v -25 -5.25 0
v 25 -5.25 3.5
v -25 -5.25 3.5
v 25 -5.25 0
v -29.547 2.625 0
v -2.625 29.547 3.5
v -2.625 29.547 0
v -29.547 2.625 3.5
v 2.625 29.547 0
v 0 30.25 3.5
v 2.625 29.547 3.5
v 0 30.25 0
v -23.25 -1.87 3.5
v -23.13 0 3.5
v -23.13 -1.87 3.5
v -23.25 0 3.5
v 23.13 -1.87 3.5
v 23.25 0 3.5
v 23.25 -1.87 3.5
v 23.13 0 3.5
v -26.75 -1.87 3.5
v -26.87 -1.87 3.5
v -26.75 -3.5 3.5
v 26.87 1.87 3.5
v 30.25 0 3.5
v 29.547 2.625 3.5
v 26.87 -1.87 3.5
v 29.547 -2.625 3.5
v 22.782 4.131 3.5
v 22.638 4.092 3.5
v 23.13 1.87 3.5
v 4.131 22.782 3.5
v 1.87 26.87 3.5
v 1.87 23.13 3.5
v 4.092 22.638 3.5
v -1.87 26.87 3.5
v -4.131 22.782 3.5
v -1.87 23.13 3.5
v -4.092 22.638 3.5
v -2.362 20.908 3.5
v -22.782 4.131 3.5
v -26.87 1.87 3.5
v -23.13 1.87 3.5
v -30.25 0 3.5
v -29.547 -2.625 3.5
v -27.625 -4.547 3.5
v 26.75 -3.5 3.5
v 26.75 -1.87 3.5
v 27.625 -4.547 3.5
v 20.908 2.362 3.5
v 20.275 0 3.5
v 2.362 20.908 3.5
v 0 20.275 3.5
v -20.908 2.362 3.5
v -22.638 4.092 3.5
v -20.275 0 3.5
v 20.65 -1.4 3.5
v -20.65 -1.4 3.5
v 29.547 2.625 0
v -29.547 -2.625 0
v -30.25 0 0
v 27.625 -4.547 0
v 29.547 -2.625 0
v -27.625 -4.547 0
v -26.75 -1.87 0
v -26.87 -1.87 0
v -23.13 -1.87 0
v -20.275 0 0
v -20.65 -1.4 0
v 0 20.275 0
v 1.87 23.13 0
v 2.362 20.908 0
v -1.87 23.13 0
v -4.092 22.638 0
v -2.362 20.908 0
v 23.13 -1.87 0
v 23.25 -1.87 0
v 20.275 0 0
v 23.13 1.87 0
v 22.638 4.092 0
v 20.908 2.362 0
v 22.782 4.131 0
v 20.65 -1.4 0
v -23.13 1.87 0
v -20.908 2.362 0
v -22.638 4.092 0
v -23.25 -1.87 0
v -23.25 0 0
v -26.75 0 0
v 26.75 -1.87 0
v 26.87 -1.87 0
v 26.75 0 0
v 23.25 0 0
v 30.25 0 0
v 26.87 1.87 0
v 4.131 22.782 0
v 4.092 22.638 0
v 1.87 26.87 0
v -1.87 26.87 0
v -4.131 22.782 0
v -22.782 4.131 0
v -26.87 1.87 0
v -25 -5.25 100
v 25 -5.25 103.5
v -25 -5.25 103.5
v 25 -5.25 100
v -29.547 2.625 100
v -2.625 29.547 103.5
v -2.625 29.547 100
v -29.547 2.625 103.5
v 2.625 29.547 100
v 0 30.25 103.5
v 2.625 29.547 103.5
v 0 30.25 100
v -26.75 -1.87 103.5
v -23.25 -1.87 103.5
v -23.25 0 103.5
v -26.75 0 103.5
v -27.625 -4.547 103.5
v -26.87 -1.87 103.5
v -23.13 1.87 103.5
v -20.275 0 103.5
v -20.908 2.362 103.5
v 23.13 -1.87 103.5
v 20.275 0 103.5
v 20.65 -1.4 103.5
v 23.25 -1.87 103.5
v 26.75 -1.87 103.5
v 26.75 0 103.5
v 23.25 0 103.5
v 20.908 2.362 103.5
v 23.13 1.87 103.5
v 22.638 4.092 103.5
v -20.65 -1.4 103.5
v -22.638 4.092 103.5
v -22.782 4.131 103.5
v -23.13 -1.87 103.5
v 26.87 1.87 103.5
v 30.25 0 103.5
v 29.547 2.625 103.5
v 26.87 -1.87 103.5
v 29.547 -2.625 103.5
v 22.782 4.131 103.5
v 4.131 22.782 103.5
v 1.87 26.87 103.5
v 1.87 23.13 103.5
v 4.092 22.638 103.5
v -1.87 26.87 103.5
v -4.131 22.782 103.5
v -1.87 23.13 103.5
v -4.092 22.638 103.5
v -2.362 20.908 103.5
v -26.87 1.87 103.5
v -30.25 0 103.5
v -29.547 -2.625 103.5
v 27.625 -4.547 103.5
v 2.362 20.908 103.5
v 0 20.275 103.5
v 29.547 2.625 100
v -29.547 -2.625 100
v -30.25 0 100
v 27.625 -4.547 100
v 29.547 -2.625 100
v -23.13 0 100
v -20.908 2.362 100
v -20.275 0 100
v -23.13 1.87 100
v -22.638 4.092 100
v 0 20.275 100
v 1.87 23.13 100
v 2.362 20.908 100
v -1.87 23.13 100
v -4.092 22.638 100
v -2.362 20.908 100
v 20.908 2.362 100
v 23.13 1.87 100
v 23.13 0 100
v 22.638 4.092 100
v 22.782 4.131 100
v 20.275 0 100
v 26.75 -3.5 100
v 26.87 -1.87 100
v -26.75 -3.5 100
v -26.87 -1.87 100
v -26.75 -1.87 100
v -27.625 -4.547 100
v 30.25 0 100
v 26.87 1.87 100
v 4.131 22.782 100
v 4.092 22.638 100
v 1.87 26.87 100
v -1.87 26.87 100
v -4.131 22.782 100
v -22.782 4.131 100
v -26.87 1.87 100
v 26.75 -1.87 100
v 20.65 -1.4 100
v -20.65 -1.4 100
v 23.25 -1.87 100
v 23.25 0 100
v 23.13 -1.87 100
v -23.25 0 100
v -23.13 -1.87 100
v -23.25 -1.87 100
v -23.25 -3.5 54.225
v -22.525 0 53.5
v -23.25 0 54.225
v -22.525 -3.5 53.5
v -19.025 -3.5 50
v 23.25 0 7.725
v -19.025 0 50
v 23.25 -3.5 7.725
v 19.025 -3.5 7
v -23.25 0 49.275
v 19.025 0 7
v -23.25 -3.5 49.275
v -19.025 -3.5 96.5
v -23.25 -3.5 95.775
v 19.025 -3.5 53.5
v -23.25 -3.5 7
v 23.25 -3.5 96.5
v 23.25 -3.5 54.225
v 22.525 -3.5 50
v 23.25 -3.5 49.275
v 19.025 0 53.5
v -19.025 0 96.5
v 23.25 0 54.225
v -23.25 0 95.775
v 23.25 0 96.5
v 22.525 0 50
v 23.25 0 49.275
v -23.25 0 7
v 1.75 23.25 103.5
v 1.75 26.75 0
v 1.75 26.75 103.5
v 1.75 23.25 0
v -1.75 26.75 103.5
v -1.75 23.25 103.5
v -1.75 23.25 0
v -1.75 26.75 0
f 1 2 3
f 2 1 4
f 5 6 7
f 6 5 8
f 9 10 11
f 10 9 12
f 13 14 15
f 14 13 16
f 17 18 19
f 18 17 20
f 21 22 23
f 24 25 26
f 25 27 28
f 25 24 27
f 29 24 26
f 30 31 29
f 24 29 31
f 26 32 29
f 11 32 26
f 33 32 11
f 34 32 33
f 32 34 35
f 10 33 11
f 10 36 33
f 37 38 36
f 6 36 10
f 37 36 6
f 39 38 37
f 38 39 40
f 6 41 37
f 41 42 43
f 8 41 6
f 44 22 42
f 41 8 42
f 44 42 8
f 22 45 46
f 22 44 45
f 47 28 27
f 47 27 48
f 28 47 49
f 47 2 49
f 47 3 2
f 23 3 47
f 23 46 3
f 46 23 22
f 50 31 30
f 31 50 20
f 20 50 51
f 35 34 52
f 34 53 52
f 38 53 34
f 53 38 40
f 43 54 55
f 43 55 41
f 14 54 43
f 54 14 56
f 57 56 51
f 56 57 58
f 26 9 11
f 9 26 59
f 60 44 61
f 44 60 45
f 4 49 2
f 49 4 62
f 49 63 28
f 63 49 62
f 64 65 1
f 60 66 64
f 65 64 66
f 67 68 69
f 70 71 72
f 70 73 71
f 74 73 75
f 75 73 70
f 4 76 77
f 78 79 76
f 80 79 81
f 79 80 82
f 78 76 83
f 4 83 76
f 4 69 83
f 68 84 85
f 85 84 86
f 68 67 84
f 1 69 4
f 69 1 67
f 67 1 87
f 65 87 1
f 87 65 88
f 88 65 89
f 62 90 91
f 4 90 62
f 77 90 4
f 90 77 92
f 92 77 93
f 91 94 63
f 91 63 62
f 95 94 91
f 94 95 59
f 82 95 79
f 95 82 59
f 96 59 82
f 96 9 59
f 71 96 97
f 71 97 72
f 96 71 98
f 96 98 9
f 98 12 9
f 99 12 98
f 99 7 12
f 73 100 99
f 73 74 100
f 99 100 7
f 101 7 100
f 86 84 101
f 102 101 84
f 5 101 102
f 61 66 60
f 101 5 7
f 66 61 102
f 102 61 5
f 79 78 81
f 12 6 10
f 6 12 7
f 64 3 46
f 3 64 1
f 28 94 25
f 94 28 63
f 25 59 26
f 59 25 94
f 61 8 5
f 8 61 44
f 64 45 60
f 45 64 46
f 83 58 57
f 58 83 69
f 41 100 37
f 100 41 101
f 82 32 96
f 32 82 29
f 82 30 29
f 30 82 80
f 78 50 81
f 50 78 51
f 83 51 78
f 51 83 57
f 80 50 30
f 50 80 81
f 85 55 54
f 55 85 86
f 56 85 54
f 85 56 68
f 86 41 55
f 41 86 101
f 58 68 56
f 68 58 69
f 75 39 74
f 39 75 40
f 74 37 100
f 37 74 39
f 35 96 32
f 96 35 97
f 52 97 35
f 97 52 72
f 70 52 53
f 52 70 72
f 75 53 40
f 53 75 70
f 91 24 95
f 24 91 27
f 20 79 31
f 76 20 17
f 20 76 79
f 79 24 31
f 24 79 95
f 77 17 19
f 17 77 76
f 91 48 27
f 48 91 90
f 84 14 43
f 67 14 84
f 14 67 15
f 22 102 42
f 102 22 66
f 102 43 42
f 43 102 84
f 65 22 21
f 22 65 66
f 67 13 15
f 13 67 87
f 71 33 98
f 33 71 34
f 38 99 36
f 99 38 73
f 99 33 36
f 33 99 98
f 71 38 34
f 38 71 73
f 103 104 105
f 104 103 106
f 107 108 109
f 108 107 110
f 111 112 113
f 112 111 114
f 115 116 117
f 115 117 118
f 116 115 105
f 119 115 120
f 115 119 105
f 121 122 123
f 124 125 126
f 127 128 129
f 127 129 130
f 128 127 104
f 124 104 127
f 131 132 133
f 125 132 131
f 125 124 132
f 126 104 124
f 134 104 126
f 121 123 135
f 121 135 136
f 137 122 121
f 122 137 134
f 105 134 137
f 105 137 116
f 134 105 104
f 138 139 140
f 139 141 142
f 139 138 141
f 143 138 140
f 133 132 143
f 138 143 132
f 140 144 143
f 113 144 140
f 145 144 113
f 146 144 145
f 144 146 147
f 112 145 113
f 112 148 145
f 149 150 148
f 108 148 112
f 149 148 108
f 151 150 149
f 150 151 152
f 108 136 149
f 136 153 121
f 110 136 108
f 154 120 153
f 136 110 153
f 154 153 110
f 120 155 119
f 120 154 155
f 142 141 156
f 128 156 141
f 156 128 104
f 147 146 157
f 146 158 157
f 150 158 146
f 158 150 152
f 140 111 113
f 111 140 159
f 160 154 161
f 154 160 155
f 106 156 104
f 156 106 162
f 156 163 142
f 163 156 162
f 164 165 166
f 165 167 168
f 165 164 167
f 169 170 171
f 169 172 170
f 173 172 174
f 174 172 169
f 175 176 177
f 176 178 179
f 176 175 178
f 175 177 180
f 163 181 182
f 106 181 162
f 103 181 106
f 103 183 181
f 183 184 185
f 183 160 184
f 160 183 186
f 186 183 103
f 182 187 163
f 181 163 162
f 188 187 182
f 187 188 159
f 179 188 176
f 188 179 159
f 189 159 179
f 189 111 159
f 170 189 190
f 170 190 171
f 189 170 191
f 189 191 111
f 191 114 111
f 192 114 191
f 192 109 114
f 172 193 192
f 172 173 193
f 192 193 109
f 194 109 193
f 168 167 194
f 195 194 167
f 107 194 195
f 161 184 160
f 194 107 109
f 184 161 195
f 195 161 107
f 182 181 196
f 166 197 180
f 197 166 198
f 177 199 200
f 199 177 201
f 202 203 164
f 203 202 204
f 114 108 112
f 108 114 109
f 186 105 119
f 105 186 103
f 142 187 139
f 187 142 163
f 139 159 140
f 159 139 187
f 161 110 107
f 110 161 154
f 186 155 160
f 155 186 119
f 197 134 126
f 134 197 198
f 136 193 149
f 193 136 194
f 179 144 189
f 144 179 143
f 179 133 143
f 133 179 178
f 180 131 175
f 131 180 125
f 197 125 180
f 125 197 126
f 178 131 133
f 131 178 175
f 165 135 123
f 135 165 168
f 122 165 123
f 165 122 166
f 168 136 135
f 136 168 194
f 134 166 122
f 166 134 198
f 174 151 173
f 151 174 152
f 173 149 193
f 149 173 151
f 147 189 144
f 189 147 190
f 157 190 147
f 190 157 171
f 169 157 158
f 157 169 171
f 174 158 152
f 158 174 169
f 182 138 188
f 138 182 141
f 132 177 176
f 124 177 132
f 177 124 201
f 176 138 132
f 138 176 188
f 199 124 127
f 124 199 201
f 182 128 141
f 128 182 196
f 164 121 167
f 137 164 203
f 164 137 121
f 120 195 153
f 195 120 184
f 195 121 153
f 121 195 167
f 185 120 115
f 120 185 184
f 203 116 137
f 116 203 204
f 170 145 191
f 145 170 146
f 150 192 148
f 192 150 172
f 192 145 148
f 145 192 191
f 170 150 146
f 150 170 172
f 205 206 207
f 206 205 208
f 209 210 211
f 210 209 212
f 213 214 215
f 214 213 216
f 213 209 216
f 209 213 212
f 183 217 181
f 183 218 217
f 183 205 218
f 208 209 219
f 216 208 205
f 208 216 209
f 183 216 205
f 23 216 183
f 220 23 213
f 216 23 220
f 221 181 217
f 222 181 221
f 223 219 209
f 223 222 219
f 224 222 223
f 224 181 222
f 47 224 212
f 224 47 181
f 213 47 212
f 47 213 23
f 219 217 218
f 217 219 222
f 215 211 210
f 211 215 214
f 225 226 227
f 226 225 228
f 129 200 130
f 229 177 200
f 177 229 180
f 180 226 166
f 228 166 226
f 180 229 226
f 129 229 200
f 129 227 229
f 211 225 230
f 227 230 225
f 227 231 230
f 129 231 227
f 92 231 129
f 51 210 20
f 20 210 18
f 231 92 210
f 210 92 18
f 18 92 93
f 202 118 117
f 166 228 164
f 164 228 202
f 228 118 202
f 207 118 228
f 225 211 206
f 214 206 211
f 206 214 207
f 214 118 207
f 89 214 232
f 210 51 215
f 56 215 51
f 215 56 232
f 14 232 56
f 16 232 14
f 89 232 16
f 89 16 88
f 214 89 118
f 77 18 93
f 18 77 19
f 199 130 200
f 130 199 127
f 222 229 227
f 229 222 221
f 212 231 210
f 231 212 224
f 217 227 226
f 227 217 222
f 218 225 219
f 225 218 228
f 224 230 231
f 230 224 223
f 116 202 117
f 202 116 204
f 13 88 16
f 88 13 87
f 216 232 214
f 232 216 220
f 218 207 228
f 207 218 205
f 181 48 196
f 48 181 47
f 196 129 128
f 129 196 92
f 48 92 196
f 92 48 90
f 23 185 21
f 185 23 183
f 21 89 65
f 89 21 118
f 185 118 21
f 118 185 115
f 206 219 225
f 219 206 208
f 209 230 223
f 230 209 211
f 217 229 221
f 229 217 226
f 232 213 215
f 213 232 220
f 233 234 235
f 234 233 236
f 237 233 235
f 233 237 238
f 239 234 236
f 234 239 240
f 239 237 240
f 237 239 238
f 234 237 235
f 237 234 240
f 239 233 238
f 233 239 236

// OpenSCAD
//------------------------------------------------------------
//	Construction Kit
//	(with cd case by default)
//
//	http://thingiverse.com/Benjamin
//	http://www.thingiverse.com/thing:59260
//------------------------------------------------------------

/* [Global] */
show = "assembly"; // [assembly:display assembly, plate:prepare for printing]

/* [Corners] */
number = 8; // [1:1, 2:2, 4:4, 8:8]

sphere_radius = 12;
//flatten the sphere
cut = 3;
brick_length = 142;
brick_width = 125;
brick_thickness = 10;
clearance = 0.25;

/* [Triangular] */
tri_base = 50;
tri_base_thick = 3.5;
tri_clearance = 0.12;
//height of the structure
tri_length = 100;

/* [Settings] */
// number of segments to draw a circle (used for rounding)
precision = 12;


/* [Hidden] */
preview_tab = "Triangular";


module dumb() {}
clr = clearance;
nbo = 1+sqrt(5)/2;

tri_side = tri_base / sqrt(2);
tri_height = tri_base/2;
tri_corner_radius = 1.5*tri_base_thick;
tri_inner_radius = 0.4 * tri_base_thick;



//-------------------------------------------------------------------------
if (show == "assembly") {
	if (preview_tab=="Corners") {
		translate([-brick_length/2, -brick_width/2]) cdCube();
	}

	if (preview_tab=="Triangular") {
		color("LightGrey") tri_assembly();
	}
}
//-------------------------------------------------------------------------
if (show == "plate") {
	//-------------------------------------------------------------------
	if (preview_tab=="Corners") {
		if (number == 1) {color("orange") BLF_joint();}
	
		if (number == 2) {color("orange") pairPrint();}
	
		if (number == 4) {color("orange") facePrint();}
	
		if (number == 8) {
			color("orange") {
				translate([-2.5*sphere_radius, 0, 0])
				facePrint();
				translate([2.5*sphere_radius, 0, 0])
				facePrint();
			}
		}

	}
	//-------------------------------------------------------------------
	if (preview_tab=="Triangular") {
		translate([-tri_base/2, 0, 0]) color("LightGrey") tri_plate();
	}
	//-------------------------------------------------------------------

}
//-------------------------------------------------------------------------





//-----------------------------------------------------------------------
module tri_assembly() {
	translate([0, -tri_corner_radius, 0]) tri_base();
	translate([0, -tri_corner_radius, tri_length]) tri_base();
	translate([0, tri_height, tri_length/2 + tri_base_thick/2]) tri_connect(0, tri_length);
	translate([0, 0, tri_length/2 + tri_base_thick/2]) rotate([90, 0, 0])  tri_echelle();
}
//-----------------------------------------------------------------------
module tri_plate() {

	tri_base();

	translate([tri_base/2 + 2.5 * tri_base_thick, 0, tri_base_thick/2])
	rotate([90, 0, 0]) tri_connect(0, tri_length);
	
	translate([tri_base + 4 * tri_base_thick, 0, 0]) tri_echelle();
	
	translate ([0, -3, 0]) rotate([0, 0, 180]) tri_base();
}
//-----------------------------------------------------------------------
module tri_echelle() {
	union() {
		translate([tri_base/2, 0, tri_base_thick/2])
		rotate([90, 0, 0]) tri_connect(0, tri_length);
	
		translate([-tri_base/2, 0, tri_base_thick/2])
		rotate([90, 0, 0]) tri_connect(0, tri_length);
	
		translate([0, 0, tri_base_thick/2])
		rotate([90, 0, 90]) tri_connect(0, tri_base);
		
		translate([0, tri_length/2 - tri_base_thick, tri_base_thick/2])
		rotate([90, 0, 90]) tri_connect(0, tri_base);

		translate([0, -tri_length/2 + tri_base_thick, tri_base_thick/2])
		rotate([90, 0, 90]) tri_connect(0, tri_base);

		difference() {
			translate([0, (-tri_length/2 + tri_base_thick)/2, tri_base_thick/2])
			rotate([90, 0, atan(tri_base/(tri_length/2))])
			tri_connect(0, ((tri_length)/2)/cos(atan(tri_base/(tri_length/2))- 3));

			translate([tri_base/2 - tri_base_thick, (-tri_length/2 ), tri_base_thick/2])
			cube([tri_base_thick, tri_base_thick, 2*tri_base_thick], center=true);
		}

		difference() {
			translate([0, (tri_length/2 - tri_base_thick)/2, tri_base_thick/2])
			rotate([90, 0, atan(tri_base/(tri_length/2))])
			tri_connect(0, ((tri_length)/2)/cos(atan(tri_base/(tri_length/2))- 3));
		
			translate([-tri_base/2 + tri_base_thick, tri_length/2, tri_base_thick/2])
			cube([tri_base_thick, tri_base_thick, 2*tri_base_thick], center=true);
		}


	}
}
//-----------------------------------------------------------------------
module tri_connect(pClear=0, pLength=30) {
	//translate([0, 0, (2*tri_height + tri_base_thick)/2])
	cube([tri_base_thick+2*pClear, tri_base_thick+2*pClear, pLength + tri_base_thick], center=true);
}
//-----------------------------------------------------------------------
module tri_base() {
	translate([0, tri_corner_radius, tri_base_thick/2]) {

		difference() {
			tri_frame();
			translate([tri_base/2, 0, 0]) tri_connect(tri_clearance, 2*tri_base_thick);
			translate([-tri_base/2, 0, 0]) tri_connect(tri_clearance, 2*tri_base_thick);
			translate([0, tri_height, 0]) tri_connect(tri_clearance, 2*tri_base_thick);
		}
	}
}
//-----------------------------------------------------------------------
module tri_frame() {
	translate([tri_base/2, 0, 0]) cylinder(r=tri_corner_radius*0.9, h=tri_base_thick, center = true, $fn=precision);
	translate([-tri_base/2, 0, 0]) cylinder(r=tri_corner_radius*0.9, h=tri_base_thick, center = true, $fn=precision);
	translate([0, tri_height, 0]) cylinder(r=tri_corner_radius*0.9, h=tri_base_thick, center = true, $fn=precision);

difference () {
	hull() {
		translate([tri_base/2, 0, 0])
		cylinder(r=tri_corner_radius, h=tri_base_thick, center = true, $fn=precision);
		translate([-tri_base/2, 0, 0])
		cylinder(r=tri_corner_radius, h=tri_base_thick, center = true, $fn=precision);
		translate([0, tri_height, 0])
		cylinder(r=tri_corner_radius, h=tri_base_thick, center = true, $fn=precision);
	}
	hull() {
		translate([tri_base/2, 0, 0])
		cylinder(r=tri_inner_radius, h=tri_base_thick*2, center = true, $fn=precision);
		translate([-tri_base/2, 0, 0])
		cylinder(r=tri_inner_radius, h=tri_base_thick*2, center = true, $fn=precision);
		translate([0, tri_height, 0])
		cylinder(r=tri_inner_radius, h=tri_base_thick*2, center = true, $fn=precision);
	}						
}
}
//-----------------------------------------------------------------------



//-----------------------------------------------------------------------------------------------
module facePrint() {
	translate([0, -1.5*sphere_radius, sphere_radius - brick_thickness/2 - cut]) {
	pairPrint();
	translate([0,3*sphere_radius, 0])
	scale ([-1, -1, 1]) 
	pairPrint();

	}
}
//-----------------------------------------------------------------------------------------------
module pairPrint() {
	translate([-1.5*sphere_radius, 0, 0])
	BLF_joint();

	translate([1.5*sphere_radius, 0, 0])
	scale ([-1, 1, 1]) 
	BLF_joint();
}
//-----------------------------------------------------------------------------------------------
module cdCube() {
	color("orange") {

	front();
	translate([0, brick_length, 0])
	scale([1, -1, 1])
	front();
	}
	TRBL(0);
}
//-----------------------------------------------------------------------------------------------
module front() {
	pair();
	translate([0, 0, brick_width])
	scale([1, 1, -1])
	pair();
}
//-----------------------------------------------------------------------------------------------
module pair() {
	BLF_joint();
	translate([brick_width + 2*brick_thickness, 0, 0])
	scale ([-1, 1, 1]) 
	BLF_joint();
}
//-----------------------------------------------------------------------------------------------
module BLF_joint () {
	difference () {
		translate([brick_thickness/nbo, brick_thickness/nbo, brick_thickness/2])
		sphere(r=sphere_radius, $fn= 4*precision);

		TRBL(clr);

		translate([0, 0, brick_thickness/2 - sphere_radius - 1.1*sphere_radius + cut])
		cube([2.2*sphere_radius, 2.2*sphere_radius, 2.2*sphere_radius], center=true);
	}
}
//-----------------------------------------------------------------------------------------------
module TRBL(pClear) {
	translate([0, 0, 0])
	rotate([90, 0, 90])
	 {
		cdCase(pClear, "GhostWhite");

		translate([0, 0, brick_thickness + brick_width ])
		cdCase(pClear, "GhostWhite");

		translate([0, brick_thickness, brick_thickness ])
		rotate([90, 0, 0])
		cdCase(pClear, "GhostWhite");

		translate([0, brick_width, brick_thickness ])
		rotate([90, 0, 0])
		cdCase(pClear, "GhostWhite");
	}
}
//-----------------------------------------------------------------------------------------------
module cdCase(pClear=0, pColor="orange") {
	color(pColor)
	cube([brick_length+pClear, brick_width+pClear, brick_thickness+pClear]);
}
//-----------------------------------------------------------------------------------------------
